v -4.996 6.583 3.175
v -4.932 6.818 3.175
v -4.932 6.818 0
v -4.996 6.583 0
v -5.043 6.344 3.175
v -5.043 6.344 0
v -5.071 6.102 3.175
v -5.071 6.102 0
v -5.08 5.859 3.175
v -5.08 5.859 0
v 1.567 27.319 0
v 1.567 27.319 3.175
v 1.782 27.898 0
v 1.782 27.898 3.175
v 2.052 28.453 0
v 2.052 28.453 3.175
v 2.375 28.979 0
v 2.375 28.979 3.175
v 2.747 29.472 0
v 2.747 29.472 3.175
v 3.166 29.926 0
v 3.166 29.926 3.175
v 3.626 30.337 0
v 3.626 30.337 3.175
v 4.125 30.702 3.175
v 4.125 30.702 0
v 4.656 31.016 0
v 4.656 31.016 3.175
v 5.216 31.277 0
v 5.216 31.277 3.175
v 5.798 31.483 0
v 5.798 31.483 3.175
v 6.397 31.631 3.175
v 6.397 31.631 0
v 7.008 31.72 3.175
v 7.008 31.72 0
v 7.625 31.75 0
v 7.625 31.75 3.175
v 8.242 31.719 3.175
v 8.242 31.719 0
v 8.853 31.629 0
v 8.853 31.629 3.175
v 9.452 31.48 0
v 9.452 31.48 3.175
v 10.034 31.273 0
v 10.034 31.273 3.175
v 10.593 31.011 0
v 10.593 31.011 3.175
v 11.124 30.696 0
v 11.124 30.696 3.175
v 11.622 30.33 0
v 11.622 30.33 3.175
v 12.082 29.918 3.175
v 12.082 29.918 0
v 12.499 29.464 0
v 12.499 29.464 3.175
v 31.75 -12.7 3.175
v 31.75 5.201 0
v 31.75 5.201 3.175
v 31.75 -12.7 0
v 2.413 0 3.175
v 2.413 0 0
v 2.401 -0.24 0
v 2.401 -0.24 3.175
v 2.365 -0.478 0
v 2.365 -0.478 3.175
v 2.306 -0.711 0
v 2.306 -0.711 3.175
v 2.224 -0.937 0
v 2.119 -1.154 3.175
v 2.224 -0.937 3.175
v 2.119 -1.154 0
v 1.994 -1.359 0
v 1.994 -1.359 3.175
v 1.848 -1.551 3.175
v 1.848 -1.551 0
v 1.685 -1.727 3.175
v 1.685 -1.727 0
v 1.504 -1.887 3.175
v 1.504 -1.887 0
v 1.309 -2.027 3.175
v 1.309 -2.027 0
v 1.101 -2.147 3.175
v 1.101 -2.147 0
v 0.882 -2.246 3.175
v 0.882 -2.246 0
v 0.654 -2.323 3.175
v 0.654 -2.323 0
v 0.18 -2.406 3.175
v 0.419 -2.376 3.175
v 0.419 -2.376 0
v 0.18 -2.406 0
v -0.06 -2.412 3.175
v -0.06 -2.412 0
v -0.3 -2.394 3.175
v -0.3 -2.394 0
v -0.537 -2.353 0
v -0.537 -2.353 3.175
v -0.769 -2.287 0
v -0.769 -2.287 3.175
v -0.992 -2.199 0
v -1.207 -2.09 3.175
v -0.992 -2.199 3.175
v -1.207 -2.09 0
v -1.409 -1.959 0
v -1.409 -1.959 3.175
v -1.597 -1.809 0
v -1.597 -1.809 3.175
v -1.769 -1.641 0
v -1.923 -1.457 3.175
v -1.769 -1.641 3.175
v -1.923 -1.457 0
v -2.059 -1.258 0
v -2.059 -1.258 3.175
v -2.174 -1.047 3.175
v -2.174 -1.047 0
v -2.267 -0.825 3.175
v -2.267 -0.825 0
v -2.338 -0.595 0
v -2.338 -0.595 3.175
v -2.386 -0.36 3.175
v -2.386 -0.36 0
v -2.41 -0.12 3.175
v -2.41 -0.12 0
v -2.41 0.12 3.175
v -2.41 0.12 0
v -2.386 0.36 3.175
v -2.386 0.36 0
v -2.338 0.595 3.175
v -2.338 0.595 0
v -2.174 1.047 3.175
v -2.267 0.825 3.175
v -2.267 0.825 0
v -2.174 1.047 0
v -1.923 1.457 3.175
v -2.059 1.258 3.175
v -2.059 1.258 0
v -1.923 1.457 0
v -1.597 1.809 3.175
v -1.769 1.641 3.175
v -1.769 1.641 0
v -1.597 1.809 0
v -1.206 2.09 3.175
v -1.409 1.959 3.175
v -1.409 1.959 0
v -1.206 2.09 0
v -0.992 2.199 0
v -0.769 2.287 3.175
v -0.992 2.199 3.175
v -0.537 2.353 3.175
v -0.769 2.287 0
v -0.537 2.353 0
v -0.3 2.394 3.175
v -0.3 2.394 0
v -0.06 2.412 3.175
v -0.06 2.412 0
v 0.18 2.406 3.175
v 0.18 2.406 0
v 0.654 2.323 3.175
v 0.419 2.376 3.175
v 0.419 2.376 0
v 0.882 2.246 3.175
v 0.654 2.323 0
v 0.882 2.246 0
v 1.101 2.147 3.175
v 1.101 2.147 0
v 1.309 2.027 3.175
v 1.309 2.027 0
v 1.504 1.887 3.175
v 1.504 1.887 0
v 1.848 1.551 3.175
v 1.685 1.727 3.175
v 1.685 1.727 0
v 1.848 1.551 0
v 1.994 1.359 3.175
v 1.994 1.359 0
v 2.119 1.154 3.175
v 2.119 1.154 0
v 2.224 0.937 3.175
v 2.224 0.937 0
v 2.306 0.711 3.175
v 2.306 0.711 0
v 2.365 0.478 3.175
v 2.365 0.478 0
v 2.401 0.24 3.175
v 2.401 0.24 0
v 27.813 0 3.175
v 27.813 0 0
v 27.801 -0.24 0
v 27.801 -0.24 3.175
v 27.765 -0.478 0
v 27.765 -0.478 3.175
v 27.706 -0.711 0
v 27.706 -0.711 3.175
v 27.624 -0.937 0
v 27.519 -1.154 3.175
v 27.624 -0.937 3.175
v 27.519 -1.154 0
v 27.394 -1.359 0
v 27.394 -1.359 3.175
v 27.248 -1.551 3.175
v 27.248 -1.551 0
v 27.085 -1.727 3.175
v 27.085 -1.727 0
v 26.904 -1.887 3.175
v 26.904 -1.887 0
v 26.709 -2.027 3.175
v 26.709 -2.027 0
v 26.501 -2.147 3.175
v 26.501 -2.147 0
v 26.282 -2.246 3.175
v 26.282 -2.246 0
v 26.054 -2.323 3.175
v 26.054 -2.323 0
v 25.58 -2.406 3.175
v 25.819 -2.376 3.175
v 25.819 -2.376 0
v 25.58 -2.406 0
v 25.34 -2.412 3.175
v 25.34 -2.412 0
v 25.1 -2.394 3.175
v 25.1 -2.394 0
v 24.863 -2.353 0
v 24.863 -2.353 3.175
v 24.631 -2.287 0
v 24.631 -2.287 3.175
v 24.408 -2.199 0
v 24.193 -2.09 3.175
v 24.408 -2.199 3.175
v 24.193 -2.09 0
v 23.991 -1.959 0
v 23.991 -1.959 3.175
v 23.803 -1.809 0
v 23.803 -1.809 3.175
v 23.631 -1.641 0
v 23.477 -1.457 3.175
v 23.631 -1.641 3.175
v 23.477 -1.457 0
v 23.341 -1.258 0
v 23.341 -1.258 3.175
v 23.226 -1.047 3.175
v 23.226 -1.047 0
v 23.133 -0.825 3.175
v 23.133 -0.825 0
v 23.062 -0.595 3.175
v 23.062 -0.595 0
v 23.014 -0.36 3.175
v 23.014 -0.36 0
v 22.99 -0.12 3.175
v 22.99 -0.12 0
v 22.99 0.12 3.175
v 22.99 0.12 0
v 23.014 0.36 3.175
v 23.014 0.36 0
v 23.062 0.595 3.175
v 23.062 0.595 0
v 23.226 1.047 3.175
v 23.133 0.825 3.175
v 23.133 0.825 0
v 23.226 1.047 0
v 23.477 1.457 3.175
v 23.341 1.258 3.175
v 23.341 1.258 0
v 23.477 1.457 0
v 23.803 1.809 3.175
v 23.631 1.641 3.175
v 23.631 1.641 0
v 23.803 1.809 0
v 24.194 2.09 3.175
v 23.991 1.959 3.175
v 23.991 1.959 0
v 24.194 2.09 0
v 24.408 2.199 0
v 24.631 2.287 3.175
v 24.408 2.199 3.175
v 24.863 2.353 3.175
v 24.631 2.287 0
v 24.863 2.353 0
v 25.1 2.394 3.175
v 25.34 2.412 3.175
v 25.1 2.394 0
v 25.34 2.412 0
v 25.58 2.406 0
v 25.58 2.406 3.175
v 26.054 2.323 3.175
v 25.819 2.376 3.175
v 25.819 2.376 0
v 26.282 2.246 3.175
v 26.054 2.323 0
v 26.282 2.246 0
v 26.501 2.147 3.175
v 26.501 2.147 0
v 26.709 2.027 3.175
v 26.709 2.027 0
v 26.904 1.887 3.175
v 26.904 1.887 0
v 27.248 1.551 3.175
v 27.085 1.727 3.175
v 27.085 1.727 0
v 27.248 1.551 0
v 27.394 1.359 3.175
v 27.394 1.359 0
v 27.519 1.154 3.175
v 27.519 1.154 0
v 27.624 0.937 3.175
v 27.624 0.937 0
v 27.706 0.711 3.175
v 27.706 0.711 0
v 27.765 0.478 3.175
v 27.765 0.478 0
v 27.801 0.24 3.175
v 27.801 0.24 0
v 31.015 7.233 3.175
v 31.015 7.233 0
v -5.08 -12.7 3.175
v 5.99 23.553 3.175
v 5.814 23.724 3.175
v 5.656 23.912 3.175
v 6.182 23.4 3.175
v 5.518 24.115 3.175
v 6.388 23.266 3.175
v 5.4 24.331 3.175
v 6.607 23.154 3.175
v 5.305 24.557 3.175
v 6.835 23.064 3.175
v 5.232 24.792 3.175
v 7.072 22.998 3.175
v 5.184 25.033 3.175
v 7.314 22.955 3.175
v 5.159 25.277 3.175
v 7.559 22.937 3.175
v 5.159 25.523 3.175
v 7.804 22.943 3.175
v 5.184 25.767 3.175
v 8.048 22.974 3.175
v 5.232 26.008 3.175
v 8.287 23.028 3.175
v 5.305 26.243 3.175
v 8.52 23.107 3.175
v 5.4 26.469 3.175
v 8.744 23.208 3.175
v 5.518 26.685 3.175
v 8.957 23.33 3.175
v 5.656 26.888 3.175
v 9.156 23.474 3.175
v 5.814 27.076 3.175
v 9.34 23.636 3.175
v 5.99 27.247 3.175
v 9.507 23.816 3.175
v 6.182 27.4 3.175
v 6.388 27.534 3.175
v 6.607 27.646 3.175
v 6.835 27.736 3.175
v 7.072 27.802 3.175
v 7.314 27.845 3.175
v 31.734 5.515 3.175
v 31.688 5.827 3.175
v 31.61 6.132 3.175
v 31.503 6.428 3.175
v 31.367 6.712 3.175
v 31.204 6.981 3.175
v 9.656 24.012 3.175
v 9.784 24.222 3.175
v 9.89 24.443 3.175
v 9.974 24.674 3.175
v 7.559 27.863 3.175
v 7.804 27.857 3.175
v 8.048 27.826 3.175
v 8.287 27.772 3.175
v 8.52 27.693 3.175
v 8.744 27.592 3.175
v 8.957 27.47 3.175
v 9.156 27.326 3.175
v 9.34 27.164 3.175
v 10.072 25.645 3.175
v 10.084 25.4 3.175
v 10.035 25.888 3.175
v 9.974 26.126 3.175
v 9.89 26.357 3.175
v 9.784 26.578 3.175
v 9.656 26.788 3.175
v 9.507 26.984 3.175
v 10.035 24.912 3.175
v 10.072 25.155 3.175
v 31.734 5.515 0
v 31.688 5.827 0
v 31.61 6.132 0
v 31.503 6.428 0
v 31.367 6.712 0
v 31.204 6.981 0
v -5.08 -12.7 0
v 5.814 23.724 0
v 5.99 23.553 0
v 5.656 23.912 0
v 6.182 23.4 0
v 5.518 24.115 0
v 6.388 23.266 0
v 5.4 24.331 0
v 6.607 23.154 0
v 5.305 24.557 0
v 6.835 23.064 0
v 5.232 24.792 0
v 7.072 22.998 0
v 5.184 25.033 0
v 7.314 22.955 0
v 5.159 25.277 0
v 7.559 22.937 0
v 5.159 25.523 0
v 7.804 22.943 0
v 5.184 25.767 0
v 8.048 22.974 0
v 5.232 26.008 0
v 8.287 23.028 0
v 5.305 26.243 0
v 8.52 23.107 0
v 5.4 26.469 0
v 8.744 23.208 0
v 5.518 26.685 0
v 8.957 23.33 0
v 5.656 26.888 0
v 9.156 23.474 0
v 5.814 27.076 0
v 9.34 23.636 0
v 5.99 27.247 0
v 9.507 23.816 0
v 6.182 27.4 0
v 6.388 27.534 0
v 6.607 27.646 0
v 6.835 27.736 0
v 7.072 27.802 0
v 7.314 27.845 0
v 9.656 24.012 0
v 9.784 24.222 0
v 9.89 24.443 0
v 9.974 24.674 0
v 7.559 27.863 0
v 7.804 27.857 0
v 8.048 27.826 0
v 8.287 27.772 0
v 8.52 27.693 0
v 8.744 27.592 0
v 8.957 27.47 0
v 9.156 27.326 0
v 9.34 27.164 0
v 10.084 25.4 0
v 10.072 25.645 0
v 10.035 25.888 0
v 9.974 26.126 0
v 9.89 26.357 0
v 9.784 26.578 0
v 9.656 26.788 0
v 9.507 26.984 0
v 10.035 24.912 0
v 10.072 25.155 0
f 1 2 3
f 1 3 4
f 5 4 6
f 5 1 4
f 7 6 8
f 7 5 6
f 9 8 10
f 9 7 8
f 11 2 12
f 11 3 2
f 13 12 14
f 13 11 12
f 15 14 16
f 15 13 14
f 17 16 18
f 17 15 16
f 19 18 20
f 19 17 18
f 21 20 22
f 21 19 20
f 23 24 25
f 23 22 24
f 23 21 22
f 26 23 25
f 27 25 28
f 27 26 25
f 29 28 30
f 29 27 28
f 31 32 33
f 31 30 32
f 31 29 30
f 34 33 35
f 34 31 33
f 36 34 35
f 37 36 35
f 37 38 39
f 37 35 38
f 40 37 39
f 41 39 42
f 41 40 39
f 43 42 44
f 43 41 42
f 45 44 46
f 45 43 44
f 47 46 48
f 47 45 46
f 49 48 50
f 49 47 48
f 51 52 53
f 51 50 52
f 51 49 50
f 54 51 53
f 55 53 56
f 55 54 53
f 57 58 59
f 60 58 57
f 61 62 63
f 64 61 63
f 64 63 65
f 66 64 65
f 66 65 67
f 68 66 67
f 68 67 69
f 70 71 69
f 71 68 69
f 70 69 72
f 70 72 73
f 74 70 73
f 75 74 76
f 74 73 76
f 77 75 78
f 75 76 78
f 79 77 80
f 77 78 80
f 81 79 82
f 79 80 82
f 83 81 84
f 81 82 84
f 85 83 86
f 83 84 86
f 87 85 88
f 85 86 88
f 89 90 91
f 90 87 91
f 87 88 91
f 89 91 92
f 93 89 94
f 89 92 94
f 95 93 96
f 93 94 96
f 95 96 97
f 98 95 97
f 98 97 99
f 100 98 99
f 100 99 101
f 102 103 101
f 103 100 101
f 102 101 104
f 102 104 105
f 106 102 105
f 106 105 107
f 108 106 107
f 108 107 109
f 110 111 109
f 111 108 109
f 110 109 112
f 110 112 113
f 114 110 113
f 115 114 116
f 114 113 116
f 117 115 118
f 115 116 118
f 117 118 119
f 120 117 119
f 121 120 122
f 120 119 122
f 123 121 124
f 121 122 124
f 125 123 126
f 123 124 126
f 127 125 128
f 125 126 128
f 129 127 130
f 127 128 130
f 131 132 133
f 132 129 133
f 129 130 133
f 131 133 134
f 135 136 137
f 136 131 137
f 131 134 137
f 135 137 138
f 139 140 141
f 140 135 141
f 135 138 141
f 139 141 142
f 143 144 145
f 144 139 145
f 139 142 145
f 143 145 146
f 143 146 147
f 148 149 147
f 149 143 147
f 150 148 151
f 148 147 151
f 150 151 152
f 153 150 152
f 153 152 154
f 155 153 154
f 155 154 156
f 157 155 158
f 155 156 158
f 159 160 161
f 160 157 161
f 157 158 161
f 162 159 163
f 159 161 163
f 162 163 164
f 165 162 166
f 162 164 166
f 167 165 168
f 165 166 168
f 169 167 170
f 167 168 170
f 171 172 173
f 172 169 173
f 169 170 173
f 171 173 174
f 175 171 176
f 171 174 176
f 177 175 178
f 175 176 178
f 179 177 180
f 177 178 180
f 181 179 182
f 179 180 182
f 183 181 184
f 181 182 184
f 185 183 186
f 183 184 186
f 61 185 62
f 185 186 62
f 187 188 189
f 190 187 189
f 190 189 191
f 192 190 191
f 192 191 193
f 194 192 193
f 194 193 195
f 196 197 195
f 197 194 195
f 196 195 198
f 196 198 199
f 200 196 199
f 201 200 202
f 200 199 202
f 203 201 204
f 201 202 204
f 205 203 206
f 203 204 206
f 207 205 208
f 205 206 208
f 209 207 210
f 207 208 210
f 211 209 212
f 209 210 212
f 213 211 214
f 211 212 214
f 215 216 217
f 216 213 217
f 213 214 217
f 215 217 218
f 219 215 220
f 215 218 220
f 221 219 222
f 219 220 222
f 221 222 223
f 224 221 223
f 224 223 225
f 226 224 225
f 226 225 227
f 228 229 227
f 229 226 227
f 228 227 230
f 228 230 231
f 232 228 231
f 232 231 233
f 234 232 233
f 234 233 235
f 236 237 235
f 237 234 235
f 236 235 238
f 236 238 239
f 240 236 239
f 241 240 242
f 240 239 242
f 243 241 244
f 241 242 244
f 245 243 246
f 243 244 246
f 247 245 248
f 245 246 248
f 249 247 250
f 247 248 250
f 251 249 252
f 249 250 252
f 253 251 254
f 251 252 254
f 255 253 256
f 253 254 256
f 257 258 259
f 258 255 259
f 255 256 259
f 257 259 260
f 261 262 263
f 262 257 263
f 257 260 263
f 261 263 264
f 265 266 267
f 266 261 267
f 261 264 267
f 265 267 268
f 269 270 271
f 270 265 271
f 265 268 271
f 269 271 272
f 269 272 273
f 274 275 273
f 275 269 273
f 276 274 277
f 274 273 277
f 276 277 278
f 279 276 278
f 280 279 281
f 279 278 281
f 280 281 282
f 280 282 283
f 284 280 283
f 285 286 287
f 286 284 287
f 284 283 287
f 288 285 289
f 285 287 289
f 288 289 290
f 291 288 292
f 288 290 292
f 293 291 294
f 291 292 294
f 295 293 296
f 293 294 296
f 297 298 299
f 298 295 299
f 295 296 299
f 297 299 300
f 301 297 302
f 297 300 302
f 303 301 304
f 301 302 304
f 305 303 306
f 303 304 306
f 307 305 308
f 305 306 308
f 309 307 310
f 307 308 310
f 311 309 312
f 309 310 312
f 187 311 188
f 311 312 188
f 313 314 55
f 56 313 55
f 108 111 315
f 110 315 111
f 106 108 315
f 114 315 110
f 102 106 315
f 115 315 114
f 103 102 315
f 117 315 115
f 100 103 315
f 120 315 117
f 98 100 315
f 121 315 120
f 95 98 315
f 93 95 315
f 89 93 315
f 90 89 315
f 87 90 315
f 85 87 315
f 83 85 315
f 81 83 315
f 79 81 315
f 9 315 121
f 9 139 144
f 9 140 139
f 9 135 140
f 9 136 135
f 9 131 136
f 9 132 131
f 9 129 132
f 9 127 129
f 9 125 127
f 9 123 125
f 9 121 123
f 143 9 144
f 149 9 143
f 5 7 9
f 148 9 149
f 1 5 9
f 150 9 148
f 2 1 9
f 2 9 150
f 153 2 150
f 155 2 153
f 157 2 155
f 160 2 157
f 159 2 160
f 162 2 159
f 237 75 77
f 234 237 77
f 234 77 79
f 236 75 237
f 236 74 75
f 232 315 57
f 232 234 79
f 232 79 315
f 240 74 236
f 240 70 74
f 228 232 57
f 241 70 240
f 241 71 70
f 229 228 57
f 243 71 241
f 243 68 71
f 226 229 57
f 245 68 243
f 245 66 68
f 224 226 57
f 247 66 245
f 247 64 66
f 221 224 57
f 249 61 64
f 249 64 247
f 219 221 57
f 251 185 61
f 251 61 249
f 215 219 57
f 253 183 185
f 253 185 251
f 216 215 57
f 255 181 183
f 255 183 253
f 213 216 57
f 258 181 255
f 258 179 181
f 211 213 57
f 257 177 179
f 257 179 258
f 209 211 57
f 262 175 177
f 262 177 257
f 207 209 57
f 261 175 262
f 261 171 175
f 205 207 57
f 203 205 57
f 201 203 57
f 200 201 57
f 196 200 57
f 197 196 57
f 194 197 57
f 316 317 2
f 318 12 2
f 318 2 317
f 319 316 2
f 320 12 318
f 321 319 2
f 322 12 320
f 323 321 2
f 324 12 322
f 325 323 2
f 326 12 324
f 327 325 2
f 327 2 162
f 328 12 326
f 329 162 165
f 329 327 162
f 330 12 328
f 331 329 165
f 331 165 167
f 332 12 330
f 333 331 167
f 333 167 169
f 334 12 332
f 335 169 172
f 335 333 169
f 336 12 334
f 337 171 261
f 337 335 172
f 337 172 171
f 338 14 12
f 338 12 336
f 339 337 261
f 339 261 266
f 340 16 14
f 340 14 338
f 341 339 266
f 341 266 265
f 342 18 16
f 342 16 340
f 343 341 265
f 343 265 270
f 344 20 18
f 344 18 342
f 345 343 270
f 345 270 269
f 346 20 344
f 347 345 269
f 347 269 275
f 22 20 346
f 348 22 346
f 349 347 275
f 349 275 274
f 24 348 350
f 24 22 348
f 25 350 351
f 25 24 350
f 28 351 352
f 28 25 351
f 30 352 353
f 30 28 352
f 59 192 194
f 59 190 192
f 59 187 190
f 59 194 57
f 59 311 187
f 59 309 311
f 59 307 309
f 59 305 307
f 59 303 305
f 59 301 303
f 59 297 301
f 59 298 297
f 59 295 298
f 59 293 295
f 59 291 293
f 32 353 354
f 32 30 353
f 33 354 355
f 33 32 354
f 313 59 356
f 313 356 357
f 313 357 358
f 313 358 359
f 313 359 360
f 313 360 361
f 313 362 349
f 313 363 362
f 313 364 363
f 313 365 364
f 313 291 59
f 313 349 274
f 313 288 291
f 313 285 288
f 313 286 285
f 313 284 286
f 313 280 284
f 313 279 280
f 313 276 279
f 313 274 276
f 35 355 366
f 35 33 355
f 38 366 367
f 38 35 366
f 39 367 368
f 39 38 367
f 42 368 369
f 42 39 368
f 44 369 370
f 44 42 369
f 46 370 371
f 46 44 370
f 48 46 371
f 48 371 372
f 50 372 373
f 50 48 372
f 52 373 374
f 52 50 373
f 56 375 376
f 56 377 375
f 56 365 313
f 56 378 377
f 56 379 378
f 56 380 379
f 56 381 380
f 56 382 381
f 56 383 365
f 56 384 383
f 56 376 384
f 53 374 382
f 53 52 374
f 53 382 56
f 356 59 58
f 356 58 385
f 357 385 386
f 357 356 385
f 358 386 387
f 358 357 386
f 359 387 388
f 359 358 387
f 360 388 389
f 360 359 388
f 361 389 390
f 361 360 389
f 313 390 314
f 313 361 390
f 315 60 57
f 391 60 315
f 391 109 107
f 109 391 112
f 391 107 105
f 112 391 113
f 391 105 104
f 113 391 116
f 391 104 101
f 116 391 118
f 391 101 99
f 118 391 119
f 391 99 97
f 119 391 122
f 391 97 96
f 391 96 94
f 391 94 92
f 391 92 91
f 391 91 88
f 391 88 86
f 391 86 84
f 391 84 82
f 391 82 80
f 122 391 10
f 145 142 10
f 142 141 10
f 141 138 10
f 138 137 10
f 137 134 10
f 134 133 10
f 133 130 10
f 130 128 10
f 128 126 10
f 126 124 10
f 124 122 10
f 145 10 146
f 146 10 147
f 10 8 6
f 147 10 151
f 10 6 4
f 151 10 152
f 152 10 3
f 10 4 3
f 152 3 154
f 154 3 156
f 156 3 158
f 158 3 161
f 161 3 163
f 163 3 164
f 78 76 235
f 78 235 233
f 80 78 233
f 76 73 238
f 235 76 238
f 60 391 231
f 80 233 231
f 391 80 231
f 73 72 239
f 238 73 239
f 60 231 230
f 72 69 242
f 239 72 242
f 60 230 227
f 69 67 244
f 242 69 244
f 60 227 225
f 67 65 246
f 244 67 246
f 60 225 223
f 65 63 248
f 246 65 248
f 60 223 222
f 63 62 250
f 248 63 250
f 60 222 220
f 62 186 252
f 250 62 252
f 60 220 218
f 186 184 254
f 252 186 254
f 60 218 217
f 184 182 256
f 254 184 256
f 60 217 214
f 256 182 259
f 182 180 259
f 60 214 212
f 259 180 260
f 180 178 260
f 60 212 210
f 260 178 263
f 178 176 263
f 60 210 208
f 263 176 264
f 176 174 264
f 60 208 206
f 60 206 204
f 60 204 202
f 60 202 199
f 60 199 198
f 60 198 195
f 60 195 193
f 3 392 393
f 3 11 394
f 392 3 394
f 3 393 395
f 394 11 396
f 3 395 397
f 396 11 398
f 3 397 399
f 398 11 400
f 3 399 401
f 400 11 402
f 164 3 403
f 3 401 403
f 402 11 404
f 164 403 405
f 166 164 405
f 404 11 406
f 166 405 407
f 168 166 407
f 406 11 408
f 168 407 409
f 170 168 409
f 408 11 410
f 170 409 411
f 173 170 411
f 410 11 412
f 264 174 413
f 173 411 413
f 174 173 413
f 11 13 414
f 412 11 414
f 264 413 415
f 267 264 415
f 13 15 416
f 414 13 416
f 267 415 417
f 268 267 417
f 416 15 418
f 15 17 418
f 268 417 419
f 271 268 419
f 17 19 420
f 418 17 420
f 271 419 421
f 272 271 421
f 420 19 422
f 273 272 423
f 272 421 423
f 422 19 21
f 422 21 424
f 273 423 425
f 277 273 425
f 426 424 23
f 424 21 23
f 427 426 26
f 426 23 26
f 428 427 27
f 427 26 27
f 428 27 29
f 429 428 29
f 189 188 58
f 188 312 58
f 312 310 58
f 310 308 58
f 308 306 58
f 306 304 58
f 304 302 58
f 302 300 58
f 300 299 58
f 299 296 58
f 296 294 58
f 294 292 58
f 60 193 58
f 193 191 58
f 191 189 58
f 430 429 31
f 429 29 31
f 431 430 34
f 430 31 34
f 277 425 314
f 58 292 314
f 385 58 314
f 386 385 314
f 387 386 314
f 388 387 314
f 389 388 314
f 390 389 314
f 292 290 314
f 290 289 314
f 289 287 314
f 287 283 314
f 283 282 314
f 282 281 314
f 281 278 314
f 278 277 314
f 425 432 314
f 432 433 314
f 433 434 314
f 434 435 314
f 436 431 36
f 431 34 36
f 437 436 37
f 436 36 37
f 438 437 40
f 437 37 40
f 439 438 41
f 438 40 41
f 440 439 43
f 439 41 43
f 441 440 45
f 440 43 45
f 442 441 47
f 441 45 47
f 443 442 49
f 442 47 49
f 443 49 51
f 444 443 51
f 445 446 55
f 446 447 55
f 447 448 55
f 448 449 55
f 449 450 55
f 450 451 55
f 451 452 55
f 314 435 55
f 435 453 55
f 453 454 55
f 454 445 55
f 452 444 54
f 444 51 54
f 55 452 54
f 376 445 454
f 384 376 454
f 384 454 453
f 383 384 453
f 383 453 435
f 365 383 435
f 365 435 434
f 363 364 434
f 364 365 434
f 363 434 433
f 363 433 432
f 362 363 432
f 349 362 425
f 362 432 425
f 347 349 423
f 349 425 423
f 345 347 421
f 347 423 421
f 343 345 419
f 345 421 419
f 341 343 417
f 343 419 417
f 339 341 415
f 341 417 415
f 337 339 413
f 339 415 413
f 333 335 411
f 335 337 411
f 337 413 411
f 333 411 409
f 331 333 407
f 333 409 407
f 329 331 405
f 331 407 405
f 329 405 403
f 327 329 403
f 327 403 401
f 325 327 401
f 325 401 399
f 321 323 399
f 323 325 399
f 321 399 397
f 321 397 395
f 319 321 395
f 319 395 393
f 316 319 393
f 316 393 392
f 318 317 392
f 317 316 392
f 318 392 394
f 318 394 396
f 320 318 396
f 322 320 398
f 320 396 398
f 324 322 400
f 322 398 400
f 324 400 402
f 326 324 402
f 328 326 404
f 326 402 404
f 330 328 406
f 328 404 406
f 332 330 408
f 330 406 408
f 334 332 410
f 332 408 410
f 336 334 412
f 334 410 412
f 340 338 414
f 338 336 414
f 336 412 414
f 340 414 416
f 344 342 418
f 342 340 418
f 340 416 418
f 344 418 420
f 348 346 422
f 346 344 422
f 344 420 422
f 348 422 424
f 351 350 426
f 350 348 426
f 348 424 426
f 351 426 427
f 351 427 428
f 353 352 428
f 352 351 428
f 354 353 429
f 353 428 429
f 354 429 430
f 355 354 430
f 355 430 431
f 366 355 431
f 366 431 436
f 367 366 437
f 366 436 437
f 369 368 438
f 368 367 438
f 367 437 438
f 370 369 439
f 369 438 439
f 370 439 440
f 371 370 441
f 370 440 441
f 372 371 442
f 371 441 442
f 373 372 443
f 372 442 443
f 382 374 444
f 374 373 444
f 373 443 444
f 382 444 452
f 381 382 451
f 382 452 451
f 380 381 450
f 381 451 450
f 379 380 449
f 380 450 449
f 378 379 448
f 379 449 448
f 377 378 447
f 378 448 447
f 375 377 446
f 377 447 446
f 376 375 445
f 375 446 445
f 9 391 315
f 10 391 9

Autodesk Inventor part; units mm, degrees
ref_plane "YZ Plane" through (0, 0, 0) normal (1, 0, 0) x (0, 1, 0)
ref_plane "XZ Plane" through (0, 0, 0) normal (0, 1, 0) x (-1, 0, 0)
ref_plane "XY Plane" through (0, 0, 0) normal (0, 0, 1) x (1, 0, 0)
sketch "Sketch1" plane through (0, 0, 0) normal (0, 0, 1) x (1, 0, 0)
  circle A0 centre (0, 0) radius 2.413
  circle A1 centre (25.4, 0) radius 2.413
  line L0 (25.4, 0) -> (0, 0) construction
  line L1 (-5.08, 6.35) -> (31.75, 6.35) construction
  line L2 (31.75, 6.35) -> (31.75, -12.7)
  line L3 (31.75, -12.7) -> (-5.08, -12.7)
  line L4 (-5.08, -12.7) -> (-5.08, 6.35)
  line L5 (-5.08, 6.35) -> (1.5668, 27.3188)
  line L6 (31.75, 6.35) -> (12.4993, 29.4638)
  circle A2 centre (7.62, 25.4) radius 2.4638
  arc A3 (12.4993, 29.4638) -> (1.5668, 27.3188) centre (7.62, 25.4) ccw
  line L7 (-5.08, -12.7) -> (-5.08, 6.35)
  line L8 (-5.08, -12.7) -> (31.75, -12.7)
  line L9 (31.75, -12.7) -> (31.75, 6.35)
  line L10 (31.75, 6.35) -> (12.4993, 29.4638)
  dimension "d1" = 4.826
  dimension "d5" = 12.7
  dimension "d6" = 6.35
  dimension "d7" = 5.08
  dimension "d9" = 6.35
  dimension "d10" = 25.4
  dimension "d14" = 12.7
  dimension "d15" = 19.05
  dimension "d16" = 4.9276
  dimension "d17" = 6.35
extrude "Extrusion1" add sketch "Sketch1" along normal blind 3.175
fillet "Fillet1" radius 3.175 2 edges at (31.75, 6.35, 1.5875) (-5.08, 6.35, 1.5875)
properties part number "Bracket" material "Aluminum 6061"
